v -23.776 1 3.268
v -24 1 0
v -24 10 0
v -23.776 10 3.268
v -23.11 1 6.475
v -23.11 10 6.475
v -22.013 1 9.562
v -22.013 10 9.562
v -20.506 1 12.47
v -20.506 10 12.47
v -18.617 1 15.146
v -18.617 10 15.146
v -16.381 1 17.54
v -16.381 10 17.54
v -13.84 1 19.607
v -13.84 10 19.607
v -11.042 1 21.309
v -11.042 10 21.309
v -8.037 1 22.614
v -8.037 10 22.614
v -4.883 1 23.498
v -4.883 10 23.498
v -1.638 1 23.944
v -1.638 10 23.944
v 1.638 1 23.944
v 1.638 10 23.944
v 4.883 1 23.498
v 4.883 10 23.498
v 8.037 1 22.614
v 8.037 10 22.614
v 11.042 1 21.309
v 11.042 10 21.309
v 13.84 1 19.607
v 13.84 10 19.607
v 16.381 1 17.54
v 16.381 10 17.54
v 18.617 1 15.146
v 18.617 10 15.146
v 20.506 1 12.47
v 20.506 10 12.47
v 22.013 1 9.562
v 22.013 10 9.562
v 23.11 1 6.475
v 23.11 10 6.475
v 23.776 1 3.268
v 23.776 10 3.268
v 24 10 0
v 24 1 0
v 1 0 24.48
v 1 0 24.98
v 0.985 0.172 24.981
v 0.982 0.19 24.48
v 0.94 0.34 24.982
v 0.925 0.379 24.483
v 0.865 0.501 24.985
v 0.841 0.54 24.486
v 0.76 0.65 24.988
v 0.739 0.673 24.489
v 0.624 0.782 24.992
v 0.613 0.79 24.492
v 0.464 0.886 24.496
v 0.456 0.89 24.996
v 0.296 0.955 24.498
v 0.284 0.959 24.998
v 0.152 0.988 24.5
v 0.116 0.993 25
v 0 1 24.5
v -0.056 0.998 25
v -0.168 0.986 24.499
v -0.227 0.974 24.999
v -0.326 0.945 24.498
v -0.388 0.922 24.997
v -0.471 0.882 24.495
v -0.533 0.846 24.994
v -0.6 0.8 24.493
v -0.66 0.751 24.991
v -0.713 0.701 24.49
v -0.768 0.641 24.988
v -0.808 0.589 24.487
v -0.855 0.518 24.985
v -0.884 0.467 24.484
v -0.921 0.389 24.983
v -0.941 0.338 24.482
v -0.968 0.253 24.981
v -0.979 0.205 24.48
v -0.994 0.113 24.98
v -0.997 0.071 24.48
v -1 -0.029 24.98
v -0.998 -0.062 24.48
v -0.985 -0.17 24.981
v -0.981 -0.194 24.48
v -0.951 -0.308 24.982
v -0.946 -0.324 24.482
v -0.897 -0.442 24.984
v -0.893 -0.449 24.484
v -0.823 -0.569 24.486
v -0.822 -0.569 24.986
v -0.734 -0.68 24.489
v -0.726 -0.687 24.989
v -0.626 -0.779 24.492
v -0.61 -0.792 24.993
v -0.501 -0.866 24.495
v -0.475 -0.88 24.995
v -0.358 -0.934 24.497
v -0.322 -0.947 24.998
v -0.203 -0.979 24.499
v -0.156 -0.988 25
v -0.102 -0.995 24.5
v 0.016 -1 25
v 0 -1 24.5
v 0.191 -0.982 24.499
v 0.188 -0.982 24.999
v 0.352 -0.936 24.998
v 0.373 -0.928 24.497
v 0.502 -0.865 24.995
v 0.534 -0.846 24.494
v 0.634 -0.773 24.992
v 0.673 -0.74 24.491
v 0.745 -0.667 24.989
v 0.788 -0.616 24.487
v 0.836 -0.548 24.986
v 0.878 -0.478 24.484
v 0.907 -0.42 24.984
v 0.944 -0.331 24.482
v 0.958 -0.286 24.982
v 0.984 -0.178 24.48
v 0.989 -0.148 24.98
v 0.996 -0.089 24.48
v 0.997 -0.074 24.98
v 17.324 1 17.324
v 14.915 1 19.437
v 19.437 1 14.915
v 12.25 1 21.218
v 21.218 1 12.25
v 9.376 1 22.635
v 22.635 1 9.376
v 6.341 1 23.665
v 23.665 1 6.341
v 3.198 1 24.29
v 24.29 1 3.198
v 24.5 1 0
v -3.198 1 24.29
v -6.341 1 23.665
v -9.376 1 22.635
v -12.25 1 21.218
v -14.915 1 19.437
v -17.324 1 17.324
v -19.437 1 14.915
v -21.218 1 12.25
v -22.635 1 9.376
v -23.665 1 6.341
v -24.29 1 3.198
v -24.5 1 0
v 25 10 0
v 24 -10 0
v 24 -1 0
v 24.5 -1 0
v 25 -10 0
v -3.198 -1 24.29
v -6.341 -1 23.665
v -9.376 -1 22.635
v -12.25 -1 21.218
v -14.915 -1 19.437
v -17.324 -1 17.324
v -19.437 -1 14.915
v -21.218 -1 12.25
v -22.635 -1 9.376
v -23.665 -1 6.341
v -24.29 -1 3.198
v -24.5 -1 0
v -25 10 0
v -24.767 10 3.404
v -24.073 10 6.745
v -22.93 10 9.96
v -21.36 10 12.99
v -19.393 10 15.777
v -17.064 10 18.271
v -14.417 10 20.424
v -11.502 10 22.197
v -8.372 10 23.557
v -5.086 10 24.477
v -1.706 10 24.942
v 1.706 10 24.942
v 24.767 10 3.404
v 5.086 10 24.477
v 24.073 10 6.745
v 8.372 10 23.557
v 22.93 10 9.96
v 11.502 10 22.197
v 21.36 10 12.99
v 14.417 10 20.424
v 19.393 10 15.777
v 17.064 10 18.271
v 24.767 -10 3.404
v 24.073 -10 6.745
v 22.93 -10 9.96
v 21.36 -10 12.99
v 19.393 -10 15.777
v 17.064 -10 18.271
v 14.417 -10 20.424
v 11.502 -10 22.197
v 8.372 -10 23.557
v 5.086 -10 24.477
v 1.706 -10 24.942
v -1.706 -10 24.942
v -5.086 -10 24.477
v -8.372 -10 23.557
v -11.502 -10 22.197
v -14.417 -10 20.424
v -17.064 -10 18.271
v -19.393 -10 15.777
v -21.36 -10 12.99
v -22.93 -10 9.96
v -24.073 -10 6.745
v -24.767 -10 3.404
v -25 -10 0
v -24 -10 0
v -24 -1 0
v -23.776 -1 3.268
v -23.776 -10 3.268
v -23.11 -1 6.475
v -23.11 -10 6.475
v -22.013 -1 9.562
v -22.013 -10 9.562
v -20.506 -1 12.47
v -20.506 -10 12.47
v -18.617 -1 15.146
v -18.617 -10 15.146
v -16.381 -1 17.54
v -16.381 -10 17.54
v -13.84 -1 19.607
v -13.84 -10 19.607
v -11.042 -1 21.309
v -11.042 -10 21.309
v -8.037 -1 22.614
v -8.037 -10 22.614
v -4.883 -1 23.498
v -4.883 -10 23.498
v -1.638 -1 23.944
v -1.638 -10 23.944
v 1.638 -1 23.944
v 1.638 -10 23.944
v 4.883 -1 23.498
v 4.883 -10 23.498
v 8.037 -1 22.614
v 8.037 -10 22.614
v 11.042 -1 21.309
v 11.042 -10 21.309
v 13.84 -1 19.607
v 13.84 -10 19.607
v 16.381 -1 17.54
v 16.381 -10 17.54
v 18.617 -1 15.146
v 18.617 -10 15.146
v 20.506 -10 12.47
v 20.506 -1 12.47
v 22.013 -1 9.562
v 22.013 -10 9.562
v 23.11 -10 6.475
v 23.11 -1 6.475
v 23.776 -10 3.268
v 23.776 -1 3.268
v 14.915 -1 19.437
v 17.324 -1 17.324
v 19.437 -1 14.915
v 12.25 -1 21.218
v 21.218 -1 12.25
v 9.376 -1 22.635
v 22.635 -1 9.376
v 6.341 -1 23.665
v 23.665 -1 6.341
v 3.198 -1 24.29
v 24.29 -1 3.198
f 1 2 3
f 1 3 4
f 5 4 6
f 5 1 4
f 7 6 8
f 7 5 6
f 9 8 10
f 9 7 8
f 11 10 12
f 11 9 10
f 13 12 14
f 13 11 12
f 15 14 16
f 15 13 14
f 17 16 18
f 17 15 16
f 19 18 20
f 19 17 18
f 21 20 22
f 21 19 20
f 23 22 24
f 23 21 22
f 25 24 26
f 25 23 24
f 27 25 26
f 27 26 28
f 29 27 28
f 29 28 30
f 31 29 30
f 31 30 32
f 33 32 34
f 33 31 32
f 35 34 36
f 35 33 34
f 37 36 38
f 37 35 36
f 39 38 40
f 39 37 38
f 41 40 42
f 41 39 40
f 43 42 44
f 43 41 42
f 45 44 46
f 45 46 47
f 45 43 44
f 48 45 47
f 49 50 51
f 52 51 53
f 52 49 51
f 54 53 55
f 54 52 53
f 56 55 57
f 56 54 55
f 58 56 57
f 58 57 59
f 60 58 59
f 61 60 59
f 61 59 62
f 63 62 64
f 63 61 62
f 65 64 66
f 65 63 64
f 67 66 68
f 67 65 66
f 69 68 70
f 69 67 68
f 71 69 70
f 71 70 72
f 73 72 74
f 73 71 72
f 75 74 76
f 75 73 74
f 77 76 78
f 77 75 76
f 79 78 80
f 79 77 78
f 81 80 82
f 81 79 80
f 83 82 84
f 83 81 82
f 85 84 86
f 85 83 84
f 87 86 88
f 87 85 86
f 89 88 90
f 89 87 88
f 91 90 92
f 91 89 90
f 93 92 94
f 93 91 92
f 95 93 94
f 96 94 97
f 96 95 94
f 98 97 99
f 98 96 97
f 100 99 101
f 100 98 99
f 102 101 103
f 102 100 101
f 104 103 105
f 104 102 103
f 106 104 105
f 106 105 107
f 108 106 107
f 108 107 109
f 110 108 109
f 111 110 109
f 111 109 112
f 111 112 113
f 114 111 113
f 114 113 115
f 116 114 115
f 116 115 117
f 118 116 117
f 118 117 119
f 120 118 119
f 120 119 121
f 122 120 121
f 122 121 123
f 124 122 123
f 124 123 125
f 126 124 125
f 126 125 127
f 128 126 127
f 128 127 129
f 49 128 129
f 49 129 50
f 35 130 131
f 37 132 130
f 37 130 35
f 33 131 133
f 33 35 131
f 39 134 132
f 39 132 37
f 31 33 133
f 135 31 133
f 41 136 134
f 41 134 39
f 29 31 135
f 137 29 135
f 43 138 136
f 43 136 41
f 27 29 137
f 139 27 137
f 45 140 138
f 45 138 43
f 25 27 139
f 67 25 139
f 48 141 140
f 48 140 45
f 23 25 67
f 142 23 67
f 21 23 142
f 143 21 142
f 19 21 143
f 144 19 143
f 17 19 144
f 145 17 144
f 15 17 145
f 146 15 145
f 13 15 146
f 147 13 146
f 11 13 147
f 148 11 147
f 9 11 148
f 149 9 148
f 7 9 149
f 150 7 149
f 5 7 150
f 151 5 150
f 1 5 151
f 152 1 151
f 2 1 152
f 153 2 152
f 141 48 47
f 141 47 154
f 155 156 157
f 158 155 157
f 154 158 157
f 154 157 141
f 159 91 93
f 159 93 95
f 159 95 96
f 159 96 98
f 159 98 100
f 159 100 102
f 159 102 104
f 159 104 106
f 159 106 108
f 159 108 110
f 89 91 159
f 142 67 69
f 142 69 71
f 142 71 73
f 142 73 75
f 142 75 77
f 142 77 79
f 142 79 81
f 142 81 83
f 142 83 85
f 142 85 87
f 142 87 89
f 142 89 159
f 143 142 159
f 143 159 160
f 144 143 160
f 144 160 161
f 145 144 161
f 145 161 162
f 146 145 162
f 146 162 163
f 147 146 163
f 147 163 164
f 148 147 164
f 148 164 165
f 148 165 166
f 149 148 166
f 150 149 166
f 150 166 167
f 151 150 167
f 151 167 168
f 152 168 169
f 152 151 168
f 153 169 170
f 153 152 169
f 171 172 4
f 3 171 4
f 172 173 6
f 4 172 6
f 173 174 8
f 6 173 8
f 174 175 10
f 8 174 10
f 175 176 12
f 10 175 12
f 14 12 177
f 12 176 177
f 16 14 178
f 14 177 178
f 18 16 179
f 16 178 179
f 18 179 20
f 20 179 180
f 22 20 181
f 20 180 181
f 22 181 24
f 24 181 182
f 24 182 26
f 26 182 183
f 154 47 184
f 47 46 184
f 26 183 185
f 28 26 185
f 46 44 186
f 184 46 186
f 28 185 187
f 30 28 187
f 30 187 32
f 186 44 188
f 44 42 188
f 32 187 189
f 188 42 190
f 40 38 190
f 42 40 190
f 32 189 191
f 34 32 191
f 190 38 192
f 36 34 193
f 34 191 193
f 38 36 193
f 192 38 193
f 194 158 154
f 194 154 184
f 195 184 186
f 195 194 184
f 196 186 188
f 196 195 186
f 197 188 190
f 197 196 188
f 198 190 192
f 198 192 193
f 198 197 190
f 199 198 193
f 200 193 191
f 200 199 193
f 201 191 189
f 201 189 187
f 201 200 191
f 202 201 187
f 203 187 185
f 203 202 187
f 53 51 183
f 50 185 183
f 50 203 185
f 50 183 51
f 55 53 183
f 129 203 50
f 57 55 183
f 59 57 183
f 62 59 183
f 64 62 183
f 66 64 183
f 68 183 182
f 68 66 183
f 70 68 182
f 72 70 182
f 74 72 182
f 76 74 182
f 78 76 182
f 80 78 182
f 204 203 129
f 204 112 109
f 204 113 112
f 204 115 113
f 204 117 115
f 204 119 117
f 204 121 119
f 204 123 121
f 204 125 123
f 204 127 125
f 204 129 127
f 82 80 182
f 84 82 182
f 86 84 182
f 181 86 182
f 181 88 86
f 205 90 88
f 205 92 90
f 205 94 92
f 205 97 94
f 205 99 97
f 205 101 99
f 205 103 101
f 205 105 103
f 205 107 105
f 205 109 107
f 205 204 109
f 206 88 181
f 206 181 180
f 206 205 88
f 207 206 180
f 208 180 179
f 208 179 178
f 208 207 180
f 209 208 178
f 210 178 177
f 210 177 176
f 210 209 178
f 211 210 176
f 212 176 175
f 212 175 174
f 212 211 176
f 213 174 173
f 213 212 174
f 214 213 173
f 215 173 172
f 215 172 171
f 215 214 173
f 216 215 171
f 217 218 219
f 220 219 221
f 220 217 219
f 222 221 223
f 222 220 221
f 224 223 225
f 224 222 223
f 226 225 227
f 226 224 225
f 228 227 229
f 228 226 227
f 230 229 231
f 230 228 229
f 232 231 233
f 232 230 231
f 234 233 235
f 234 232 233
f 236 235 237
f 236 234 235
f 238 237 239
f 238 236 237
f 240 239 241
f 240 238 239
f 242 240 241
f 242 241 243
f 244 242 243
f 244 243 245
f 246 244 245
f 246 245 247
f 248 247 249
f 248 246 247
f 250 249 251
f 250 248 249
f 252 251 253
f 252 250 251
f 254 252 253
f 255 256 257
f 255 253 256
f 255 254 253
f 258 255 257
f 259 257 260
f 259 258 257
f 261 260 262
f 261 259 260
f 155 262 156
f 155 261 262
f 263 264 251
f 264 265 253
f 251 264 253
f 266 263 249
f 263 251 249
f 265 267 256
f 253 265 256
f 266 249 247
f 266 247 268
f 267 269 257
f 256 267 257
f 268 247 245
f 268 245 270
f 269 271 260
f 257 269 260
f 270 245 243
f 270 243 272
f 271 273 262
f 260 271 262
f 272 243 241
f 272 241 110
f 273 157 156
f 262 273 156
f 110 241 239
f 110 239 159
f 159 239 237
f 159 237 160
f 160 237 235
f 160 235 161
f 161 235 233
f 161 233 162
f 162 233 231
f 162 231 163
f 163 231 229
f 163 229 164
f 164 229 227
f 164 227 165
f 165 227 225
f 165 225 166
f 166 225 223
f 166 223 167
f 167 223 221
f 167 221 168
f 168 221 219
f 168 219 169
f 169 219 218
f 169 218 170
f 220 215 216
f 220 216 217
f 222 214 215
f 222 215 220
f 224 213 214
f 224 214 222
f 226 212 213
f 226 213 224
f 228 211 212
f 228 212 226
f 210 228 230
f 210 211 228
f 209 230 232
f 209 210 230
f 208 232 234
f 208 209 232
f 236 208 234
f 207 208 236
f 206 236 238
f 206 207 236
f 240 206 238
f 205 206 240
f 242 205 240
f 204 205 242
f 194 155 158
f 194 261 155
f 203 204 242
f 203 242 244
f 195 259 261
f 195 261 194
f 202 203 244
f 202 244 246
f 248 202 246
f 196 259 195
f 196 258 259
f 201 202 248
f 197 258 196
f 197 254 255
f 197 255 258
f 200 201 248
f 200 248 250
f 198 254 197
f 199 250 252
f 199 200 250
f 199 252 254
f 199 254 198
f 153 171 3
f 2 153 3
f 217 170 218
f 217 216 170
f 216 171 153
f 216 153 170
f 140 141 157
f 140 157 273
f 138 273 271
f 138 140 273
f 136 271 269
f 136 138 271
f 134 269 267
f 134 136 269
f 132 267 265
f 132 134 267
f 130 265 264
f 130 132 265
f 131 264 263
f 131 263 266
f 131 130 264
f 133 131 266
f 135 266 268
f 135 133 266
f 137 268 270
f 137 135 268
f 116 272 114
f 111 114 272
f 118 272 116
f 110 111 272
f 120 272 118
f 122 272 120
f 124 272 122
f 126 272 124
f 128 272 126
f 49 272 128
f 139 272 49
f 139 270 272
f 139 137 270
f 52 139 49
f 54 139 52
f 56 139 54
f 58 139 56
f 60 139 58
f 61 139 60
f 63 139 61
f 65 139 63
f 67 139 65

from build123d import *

# Parameters (mm, degrees)
F1_DEPTH = 10
F2_W     = 0.5
F2_H     = 2
F4_R     = 1
F5_DEPTH = 25.001


with BuildPart() as f1:
    # F0 (on Front) → F1 (new body, symmetric)
    with BuildSketch(Plane.XZ):
        with BuildLine():
            Line((24, 0), (25, 0))
            ThreePointArc((25, 0), (0, 25), (-25, 0))
            Line((-25, 0), (-24, 0))
            ThreePointArc((-24, 0), (0, 24), (24, 0))
        make_face()
    extrude(amount=F1_DEPTH, both=True)

    # F2 (on Top) → F3 (revolve, cut)
    with BuildSketch(Plane.XY):
        with Locations((-24.25, 0)):
            Rectangle(F2_W, F2_H)
    revolve(axis=Axis((0, 0, 0), (0, -1, 0)), mode=Mode.SUBTRACT)

    # F4 (on Top) → F5 (cut, through all)
    with BuildSketch(Plane.XY):
        Circle(F4_R)
    extrude(amount=F5_DEPTH, mode=Mode.SUBTRACT)


solid = f1.part
